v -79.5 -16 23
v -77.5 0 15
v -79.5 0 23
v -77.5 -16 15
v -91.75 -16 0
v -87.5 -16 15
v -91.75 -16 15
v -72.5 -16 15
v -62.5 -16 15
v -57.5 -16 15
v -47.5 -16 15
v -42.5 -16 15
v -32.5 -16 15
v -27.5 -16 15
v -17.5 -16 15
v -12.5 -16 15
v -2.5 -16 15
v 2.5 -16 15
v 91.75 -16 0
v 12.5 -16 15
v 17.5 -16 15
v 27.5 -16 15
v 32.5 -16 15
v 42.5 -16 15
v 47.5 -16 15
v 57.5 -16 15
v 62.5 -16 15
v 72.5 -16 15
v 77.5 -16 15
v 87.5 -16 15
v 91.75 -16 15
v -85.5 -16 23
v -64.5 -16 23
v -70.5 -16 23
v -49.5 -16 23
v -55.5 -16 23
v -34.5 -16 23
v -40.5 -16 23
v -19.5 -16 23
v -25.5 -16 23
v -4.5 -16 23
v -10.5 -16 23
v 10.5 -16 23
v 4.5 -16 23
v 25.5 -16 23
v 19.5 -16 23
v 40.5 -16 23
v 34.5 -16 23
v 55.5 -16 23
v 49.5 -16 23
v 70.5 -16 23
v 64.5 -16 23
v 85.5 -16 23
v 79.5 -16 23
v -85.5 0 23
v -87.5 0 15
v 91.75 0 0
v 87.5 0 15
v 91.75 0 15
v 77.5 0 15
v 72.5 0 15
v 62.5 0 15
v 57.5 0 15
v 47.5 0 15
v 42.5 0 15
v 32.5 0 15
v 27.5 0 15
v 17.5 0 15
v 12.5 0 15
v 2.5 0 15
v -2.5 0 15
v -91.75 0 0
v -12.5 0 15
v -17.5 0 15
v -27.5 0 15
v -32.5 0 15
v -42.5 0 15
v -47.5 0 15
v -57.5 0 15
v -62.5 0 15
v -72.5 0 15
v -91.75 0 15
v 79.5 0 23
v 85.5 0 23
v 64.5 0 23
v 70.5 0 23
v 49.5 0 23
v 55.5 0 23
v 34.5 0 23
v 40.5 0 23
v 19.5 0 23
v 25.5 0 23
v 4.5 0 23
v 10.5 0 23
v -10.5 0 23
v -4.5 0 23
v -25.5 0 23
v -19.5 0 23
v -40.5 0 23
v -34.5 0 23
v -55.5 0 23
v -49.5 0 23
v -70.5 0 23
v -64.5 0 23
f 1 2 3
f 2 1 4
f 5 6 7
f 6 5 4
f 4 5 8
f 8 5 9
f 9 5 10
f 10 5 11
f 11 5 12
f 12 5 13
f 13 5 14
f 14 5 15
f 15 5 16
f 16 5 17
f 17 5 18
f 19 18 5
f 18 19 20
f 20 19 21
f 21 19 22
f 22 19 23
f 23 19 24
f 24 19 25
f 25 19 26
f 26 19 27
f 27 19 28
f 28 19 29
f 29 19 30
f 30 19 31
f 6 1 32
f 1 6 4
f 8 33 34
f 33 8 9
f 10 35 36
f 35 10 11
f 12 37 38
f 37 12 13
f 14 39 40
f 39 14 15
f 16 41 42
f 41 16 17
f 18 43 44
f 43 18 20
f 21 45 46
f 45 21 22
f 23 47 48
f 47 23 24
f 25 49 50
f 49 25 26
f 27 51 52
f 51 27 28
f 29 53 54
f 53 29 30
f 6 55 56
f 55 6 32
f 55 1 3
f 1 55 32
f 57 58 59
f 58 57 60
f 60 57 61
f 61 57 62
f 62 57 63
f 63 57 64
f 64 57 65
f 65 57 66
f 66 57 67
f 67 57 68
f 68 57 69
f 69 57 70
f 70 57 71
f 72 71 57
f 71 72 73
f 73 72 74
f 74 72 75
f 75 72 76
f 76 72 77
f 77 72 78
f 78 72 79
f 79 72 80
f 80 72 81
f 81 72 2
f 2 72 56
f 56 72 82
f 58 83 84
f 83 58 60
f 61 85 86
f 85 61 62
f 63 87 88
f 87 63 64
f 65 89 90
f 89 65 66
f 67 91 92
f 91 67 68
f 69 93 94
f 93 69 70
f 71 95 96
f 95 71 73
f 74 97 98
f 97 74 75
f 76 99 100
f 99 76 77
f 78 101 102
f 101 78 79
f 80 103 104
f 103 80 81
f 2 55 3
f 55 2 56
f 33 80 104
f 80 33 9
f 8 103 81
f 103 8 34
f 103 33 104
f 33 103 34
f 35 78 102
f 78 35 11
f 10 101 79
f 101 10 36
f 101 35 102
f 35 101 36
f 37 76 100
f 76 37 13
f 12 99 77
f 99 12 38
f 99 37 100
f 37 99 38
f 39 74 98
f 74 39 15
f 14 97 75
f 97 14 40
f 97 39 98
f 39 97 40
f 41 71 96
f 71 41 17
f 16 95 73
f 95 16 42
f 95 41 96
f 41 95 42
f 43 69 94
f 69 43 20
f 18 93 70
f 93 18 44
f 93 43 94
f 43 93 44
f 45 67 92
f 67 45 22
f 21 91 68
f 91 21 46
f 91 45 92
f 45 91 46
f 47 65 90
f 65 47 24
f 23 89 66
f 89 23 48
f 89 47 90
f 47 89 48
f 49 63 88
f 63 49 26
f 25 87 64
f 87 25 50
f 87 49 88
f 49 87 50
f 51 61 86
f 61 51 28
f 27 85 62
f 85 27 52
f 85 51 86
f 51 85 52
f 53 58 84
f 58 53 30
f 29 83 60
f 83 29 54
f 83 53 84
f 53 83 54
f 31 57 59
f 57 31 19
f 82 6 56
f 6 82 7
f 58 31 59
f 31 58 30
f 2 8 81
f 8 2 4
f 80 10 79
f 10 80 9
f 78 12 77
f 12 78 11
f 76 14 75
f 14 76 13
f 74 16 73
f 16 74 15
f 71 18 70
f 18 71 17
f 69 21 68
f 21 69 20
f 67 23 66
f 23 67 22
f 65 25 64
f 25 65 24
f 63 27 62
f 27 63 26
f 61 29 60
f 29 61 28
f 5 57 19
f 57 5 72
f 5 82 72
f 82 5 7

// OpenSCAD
$fn = 32;

// ----------------------------------------------------------------------
// Toothed rack, 12 teeth
// 15 mm pitch, 8 mm teeth
// ----------------------------------------------------------------------

// --- parameters (mm) ---
bar_w = 16;     // bar width (Y)
bar_h = 15;     // bar height (Z)
teeth = 12;     // number of teeth
pitch = 15;     // tooth pitch
tooth_h = 8;    // tooth height above the bar
root_w = 10.5;  // tooth width at the root
crest_w = 6;    // tooth width at the crest

// --- derived feature positions (mm) ---
span = (teeth - 1) * pitch;  // = 165   distance between the outer teeth
bar_l = span + root_w + 8;   // = 183.5   bar length: teeth plus 4 mm at each end
tooth_x = -span / 2;         // = -82.5   X of the first tooth
height = bar_h + tooth_h;    // = 23   overall height
feature_centers = [
  [tooth_x + 0 * pitch, -bar_w / 2],
  [tooth_x + 1 * pitch, -bar_w / 2],
  [tooth_x + 2 * pitch, -bar_w / 2],
  [tooth_x + 3 * pitch, -bar_w / 2],
  [tooth_x + 4 * pitch, -bar_w / 2],
  [tooth_x + 5 * pitch, -bar_w / 2],
  [tooth_x + 6 * pitch, -bar_w / 2],
  [tooth_x + 7 * pitch, -bar_w / 2],
  [tooth_x + 8 * pitch, -bar_w / 2],
  [tooth_x + 9 * pitch, -bar_w / 2],
  [tooth_x + 10 * pitch, -bar_w / 2],
  [tooth_x + 11 * pitch, -bar_w / 2]
];   // tooth centre line, drives the tooth loop

// bar with a rack of teeth, one extruded trapezoium per centre
module rack_tooth() {
  linear_extrude(height = bar_w)
    polygon(points = [
      [0, 0],
      [root_w, 0],
      [root_w / 2 + crest_w / 2, tooth_h + 1],
      [root_w / 2 - crest_w / 2, tooth_h + 1]
    ]);
}

union() {
  translate([-bar_l / 2, -bar_w, 0]) cube([bar_l, bar_w, bar_h]);
  for (centre = feature_centers)
    translate([centre[0] - root_w / 2, 0, bar_h - 1]) rotate([90, 0, 0]) rack_tooth();
}
